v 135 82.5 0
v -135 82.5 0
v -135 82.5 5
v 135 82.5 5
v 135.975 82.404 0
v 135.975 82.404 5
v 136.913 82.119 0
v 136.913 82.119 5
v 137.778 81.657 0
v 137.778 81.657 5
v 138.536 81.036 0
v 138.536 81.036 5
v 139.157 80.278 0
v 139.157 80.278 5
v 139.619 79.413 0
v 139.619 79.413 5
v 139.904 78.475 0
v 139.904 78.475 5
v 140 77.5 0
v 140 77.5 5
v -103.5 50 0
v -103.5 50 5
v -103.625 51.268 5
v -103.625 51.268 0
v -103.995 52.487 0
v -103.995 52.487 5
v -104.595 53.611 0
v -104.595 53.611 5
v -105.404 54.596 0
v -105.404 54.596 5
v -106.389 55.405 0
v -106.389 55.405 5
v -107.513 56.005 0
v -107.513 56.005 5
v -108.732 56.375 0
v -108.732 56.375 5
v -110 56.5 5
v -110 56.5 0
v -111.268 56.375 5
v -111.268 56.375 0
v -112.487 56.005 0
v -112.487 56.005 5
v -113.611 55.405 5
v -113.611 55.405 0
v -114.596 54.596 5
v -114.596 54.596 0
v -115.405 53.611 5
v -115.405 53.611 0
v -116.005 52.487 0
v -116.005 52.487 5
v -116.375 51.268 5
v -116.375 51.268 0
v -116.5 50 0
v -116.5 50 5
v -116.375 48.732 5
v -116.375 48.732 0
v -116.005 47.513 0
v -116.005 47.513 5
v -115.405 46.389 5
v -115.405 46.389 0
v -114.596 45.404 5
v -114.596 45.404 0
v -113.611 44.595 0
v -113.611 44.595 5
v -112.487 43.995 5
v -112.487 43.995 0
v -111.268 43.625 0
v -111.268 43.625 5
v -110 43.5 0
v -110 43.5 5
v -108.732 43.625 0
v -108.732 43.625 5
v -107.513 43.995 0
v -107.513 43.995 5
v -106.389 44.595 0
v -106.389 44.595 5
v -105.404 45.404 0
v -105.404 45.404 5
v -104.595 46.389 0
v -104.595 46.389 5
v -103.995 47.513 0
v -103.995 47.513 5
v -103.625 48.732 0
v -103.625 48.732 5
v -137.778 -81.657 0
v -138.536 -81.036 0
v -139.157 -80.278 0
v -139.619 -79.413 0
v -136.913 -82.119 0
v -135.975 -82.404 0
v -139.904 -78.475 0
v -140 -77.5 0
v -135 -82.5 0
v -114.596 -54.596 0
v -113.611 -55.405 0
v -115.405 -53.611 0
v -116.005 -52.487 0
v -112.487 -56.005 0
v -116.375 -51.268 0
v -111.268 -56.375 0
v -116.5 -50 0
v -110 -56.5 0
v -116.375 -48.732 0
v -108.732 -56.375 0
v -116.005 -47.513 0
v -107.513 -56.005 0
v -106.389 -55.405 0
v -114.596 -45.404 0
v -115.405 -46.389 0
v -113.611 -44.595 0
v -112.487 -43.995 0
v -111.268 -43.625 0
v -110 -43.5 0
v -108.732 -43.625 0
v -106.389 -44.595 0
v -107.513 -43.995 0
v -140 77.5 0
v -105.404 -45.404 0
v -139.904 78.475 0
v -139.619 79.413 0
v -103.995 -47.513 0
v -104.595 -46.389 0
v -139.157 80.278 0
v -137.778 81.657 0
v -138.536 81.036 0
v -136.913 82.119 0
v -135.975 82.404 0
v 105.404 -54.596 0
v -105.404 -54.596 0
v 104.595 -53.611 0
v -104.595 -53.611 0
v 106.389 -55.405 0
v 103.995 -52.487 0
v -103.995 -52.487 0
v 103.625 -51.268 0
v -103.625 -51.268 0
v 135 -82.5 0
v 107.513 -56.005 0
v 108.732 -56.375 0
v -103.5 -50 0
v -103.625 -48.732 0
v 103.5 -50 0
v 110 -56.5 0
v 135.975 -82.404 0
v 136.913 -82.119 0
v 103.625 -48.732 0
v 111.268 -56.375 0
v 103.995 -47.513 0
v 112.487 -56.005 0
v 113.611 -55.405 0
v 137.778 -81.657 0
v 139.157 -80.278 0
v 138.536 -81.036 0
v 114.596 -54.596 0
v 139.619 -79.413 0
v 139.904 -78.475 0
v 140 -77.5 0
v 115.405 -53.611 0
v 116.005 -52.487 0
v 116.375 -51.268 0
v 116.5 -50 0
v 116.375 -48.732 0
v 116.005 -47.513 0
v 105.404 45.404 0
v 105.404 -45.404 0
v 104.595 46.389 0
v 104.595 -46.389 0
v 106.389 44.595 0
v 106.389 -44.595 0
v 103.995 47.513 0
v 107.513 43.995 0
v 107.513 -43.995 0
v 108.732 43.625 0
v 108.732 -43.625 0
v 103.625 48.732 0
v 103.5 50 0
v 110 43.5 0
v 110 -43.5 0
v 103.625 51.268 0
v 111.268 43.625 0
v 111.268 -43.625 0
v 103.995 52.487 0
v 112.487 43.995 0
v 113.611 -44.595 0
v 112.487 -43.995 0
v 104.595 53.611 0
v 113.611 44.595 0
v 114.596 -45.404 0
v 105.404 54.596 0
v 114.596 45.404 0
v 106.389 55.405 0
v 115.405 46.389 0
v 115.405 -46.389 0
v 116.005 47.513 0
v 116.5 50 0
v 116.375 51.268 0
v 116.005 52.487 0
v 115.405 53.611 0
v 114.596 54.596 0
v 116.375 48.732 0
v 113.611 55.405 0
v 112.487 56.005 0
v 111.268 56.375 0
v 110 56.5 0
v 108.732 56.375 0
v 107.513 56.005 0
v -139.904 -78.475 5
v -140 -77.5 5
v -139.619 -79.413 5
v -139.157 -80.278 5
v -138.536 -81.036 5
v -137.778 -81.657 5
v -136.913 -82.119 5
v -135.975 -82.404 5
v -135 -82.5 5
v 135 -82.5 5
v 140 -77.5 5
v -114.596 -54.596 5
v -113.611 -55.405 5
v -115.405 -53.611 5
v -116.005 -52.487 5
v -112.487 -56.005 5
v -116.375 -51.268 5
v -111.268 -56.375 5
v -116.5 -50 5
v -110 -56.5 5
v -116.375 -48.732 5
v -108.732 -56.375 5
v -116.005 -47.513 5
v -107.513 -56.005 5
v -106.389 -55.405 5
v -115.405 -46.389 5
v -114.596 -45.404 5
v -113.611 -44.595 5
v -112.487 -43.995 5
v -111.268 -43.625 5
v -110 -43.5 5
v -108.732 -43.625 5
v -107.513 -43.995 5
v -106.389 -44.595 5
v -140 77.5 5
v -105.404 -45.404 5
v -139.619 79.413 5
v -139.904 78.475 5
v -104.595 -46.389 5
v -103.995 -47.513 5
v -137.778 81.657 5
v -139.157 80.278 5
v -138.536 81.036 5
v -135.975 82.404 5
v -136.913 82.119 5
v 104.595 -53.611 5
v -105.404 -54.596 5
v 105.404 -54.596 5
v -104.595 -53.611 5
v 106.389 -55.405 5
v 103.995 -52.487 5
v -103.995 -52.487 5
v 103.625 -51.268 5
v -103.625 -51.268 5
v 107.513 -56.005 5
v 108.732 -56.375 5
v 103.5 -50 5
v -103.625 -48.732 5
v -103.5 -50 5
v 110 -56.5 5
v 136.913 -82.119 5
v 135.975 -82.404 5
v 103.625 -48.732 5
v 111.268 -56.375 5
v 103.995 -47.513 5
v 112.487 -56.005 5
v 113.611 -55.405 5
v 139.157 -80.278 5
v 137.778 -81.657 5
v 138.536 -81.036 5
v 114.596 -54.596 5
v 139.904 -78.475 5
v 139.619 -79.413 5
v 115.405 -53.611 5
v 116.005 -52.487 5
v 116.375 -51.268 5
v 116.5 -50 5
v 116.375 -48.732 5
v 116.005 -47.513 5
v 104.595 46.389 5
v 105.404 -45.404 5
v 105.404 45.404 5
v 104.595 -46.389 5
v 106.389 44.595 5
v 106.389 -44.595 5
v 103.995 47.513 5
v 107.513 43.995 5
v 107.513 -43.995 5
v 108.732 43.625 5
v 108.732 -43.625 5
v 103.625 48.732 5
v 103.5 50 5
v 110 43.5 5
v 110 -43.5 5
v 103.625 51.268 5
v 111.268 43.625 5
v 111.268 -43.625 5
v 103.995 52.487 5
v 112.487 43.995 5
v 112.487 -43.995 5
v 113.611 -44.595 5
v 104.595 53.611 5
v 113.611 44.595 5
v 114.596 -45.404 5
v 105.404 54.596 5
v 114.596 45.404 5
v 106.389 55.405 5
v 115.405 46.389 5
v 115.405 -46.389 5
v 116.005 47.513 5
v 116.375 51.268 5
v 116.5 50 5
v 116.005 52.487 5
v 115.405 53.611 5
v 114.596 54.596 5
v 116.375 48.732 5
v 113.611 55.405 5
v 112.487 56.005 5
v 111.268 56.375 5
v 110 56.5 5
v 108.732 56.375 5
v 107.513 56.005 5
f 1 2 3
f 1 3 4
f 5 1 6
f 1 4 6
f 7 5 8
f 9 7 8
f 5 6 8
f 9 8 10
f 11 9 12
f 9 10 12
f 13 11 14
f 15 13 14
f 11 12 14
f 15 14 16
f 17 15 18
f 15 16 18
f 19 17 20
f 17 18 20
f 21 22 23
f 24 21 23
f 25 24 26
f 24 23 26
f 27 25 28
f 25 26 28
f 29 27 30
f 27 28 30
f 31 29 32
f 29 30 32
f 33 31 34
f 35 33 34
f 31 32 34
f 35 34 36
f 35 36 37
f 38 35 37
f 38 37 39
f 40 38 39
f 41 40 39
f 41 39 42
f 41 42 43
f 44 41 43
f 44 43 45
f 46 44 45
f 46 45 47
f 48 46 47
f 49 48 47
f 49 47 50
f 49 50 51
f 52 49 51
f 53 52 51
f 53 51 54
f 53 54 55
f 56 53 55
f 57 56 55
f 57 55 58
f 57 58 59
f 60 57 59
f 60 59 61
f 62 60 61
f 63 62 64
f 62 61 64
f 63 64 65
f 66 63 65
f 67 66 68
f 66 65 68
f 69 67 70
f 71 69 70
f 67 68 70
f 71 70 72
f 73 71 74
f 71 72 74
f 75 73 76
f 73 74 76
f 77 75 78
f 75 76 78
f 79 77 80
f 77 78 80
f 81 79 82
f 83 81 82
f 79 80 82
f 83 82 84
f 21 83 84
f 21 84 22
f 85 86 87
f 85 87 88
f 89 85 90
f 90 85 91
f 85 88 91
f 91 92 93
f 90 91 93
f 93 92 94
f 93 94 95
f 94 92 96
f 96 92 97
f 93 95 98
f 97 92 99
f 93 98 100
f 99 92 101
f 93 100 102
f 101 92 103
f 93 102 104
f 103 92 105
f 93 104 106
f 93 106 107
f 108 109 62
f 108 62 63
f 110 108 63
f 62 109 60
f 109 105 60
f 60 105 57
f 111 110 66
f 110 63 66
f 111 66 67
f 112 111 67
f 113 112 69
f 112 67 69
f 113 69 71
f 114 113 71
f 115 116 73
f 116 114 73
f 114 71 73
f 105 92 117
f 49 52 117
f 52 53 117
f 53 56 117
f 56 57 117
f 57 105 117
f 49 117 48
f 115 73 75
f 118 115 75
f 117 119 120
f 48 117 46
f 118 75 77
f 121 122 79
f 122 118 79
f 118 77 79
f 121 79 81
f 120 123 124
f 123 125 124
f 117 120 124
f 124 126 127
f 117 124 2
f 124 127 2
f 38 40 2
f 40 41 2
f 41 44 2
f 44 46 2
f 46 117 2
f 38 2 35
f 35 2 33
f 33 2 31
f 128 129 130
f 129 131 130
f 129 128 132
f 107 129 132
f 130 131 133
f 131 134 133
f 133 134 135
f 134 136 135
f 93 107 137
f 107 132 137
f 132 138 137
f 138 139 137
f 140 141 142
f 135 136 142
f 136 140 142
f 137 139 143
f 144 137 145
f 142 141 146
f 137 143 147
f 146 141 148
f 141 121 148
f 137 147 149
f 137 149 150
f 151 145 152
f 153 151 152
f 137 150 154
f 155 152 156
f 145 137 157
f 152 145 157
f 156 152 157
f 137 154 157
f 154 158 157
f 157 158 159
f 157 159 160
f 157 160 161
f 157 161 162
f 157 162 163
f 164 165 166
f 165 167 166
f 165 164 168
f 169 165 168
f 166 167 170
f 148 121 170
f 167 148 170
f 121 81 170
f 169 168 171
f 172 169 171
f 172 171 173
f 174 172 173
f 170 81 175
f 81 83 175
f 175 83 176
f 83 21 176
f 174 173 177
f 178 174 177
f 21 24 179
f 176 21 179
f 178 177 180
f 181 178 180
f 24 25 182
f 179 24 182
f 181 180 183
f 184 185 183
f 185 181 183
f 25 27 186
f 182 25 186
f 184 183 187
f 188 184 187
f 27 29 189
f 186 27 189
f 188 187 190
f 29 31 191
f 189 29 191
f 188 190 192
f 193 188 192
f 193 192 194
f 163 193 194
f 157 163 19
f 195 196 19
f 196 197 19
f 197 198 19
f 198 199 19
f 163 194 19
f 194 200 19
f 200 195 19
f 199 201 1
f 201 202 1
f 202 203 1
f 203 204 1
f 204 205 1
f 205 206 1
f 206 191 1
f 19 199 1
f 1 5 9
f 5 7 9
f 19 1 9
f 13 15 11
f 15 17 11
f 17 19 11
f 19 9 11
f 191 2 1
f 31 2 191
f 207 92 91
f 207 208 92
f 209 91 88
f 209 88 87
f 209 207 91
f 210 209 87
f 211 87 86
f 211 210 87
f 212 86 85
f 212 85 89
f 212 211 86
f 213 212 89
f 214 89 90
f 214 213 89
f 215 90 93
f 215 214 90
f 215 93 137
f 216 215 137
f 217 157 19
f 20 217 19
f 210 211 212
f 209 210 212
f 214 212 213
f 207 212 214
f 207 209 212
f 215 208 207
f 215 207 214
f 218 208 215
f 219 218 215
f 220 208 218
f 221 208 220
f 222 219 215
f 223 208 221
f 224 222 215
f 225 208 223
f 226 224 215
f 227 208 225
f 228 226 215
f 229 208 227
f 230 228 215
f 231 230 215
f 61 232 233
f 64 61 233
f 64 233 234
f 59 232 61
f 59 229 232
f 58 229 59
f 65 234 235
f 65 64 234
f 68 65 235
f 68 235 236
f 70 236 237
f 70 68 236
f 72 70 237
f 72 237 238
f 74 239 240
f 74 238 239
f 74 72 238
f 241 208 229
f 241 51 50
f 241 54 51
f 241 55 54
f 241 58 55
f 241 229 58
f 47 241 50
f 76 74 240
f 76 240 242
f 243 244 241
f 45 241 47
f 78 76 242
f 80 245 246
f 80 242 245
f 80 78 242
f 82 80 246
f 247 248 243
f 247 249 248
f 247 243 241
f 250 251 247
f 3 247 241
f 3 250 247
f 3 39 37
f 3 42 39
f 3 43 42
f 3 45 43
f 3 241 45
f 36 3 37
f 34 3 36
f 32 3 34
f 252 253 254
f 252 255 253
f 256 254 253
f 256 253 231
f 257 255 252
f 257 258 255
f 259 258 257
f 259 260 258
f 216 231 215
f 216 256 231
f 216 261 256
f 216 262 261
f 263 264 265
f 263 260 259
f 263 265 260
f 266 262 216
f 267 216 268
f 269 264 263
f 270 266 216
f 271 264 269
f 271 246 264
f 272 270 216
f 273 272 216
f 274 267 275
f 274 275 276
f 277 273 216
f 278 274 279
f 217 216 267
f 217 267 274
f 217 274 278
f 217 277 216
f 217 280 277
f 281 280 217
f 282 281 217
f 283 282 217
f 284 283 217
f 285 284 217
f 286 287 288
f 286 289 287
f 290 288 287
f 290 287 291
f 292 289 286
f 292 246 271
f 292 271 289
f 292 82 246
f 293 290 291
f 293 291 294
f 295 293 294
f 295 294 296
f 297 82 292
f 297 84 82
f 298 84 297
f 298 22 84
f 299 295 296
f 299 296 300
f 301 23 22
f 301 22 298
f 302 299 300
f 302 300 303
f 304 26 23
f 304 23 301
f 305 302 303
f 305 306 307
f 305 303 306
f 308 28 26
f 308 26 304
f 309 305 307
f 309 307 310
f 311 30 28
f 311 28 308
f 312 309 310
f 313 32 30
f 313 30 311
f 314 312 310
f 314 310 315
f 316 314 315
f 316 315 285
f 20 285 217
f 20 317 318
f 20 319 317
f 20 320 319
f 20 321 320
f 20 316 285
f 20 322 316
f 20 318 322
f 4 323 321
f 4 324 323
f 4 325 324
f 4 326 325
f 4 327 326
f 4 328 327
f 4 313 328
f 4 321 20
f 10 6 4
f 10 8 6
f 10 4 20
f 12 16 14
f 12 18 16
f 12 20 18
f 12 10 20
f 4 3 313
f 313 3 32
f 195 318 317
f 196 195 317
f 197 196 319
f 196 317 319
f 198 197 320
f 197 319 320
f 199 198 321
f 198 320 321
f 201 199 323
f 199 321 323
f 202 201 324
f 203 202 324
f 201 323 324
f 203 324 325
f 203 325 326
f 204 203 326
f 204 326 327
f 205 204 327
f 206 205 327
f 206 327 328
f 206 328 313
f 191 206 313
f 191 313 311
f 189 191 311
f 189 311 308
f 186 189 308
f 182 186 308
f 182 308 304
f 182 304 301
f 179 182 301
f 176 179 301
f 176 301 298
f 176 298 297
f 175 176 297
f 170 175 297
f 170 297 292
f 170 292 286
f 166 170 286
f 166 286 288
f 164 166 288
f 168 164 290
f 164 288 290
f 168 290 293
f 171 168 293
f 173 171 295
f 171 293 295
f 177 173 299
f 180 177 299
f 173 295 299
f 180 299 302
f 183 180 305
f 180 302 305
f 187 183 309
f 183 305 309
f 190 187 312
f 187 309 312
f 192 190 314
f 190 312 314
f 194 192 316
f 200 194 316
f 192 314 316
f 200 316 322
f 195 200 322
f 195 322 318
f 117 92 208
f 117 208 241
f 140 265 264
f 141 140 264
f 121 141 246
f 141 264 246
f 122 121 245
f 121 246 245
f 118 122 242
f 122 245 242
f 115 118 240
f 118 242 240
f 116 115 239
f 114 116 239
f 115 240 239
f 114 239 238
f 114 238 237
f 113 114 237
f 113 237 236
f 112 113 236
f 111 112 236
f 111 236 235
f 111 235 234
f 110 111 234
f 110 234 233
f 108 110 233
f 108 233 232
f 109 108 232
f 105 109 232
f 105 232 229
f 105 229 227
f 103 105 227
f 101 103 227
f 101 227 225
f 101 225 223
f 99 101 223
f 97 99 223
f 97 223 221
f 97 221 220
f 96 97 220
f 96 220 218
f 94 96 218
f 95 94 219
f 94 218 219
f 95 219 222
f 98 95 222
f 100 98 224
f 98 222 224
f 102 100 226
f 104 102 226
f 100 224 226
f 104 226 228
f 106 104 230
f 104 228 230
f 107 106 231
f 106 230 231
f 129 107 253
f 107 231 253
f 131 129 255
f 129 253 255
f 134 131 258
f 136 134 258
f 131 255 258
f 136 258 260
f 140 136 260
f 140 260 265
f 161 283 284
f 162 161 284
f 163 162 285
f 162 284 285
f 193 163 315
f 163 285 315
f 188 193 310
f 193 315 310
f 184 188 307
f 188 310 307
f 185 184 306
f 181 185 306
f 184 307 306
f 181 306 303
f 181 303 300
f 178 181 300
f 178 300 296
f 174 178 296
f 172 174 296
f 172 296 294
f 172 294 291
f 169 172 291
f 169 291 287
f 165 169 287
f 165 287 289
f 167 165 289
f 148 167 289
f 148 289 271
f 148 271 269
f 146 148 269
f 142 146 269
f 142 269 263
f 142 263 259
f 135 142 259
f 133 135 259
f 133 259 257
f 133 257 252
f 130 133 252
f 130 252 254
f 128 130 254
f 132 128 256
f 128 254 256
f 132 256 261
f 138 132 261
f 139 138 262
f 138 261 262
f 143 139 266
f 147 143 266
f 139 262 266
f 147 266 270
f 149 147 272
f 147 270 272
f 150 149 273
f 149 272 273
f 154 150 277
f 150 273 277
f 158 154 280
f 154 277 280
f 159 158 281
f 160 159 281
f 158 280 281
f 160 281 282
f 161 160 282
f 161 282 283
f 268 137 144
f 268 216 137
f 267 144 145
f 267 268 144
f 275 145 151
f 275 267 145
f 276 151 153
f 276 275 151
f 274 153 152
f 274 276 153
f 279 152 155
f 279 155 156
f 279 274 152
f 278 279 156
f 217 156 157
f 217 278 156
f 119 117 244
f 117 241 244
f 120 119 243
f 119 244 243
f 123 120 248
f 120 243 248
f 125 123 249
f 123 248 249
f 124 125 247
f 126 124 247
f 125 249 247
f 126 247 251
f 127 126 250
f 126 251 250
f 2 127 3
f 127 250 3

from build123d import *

# Parameters (mm, degrees)
SKETCH_1_W          = 280
SKETCH_1_H          = 165
EXTRUDE_1_DEPTH     = 5
SKETCH_2_R          = 6.5
CUT_EXTRUDE_1_DEPTH = 6
FILLET_1_R          = 5


with BuildPart() as part:
    # 草图1 → 凸台-拉伸1 (new body)
    with BuildSketch(Plane.XY):
        Rectangle(SKETCH_1_W, SKETCH_1_H)
    extrude(amount=EXTRUDE_1_DEPTH)

    # 草图2 → 切除-拉伸1 (cut)
    with BuildSketch(Plane.XY.offset(5)):
        with Locations((-110, 50)):
            Circle(SKETCH_2_R)
        with Locations((110, 50)):
            Circle(SKETCH_2_R)
        with Locations((-110, -50)):
            Circle(SKETCH_2_R)
        with Locations((110, -50)):
            Circle(SKETCH_2_R)
    extrude(amount=-CUT_EXTRUDE_1_DEPTH, mode=Mode.SUBTRACT)

    # 圆角1
    fillet_1_edges = [part.edges().sort_by_distance(p)[0] for p in [
        (140, -82.5, 2.5),
        (-140, -82.5, 2.5),
        (-140, 82.5, 2.5),
        (140, 82.5, 2.5),
    ]]
    fillet(fillet_1_edges, radius=FILLET_1_R)


solid = part.part
